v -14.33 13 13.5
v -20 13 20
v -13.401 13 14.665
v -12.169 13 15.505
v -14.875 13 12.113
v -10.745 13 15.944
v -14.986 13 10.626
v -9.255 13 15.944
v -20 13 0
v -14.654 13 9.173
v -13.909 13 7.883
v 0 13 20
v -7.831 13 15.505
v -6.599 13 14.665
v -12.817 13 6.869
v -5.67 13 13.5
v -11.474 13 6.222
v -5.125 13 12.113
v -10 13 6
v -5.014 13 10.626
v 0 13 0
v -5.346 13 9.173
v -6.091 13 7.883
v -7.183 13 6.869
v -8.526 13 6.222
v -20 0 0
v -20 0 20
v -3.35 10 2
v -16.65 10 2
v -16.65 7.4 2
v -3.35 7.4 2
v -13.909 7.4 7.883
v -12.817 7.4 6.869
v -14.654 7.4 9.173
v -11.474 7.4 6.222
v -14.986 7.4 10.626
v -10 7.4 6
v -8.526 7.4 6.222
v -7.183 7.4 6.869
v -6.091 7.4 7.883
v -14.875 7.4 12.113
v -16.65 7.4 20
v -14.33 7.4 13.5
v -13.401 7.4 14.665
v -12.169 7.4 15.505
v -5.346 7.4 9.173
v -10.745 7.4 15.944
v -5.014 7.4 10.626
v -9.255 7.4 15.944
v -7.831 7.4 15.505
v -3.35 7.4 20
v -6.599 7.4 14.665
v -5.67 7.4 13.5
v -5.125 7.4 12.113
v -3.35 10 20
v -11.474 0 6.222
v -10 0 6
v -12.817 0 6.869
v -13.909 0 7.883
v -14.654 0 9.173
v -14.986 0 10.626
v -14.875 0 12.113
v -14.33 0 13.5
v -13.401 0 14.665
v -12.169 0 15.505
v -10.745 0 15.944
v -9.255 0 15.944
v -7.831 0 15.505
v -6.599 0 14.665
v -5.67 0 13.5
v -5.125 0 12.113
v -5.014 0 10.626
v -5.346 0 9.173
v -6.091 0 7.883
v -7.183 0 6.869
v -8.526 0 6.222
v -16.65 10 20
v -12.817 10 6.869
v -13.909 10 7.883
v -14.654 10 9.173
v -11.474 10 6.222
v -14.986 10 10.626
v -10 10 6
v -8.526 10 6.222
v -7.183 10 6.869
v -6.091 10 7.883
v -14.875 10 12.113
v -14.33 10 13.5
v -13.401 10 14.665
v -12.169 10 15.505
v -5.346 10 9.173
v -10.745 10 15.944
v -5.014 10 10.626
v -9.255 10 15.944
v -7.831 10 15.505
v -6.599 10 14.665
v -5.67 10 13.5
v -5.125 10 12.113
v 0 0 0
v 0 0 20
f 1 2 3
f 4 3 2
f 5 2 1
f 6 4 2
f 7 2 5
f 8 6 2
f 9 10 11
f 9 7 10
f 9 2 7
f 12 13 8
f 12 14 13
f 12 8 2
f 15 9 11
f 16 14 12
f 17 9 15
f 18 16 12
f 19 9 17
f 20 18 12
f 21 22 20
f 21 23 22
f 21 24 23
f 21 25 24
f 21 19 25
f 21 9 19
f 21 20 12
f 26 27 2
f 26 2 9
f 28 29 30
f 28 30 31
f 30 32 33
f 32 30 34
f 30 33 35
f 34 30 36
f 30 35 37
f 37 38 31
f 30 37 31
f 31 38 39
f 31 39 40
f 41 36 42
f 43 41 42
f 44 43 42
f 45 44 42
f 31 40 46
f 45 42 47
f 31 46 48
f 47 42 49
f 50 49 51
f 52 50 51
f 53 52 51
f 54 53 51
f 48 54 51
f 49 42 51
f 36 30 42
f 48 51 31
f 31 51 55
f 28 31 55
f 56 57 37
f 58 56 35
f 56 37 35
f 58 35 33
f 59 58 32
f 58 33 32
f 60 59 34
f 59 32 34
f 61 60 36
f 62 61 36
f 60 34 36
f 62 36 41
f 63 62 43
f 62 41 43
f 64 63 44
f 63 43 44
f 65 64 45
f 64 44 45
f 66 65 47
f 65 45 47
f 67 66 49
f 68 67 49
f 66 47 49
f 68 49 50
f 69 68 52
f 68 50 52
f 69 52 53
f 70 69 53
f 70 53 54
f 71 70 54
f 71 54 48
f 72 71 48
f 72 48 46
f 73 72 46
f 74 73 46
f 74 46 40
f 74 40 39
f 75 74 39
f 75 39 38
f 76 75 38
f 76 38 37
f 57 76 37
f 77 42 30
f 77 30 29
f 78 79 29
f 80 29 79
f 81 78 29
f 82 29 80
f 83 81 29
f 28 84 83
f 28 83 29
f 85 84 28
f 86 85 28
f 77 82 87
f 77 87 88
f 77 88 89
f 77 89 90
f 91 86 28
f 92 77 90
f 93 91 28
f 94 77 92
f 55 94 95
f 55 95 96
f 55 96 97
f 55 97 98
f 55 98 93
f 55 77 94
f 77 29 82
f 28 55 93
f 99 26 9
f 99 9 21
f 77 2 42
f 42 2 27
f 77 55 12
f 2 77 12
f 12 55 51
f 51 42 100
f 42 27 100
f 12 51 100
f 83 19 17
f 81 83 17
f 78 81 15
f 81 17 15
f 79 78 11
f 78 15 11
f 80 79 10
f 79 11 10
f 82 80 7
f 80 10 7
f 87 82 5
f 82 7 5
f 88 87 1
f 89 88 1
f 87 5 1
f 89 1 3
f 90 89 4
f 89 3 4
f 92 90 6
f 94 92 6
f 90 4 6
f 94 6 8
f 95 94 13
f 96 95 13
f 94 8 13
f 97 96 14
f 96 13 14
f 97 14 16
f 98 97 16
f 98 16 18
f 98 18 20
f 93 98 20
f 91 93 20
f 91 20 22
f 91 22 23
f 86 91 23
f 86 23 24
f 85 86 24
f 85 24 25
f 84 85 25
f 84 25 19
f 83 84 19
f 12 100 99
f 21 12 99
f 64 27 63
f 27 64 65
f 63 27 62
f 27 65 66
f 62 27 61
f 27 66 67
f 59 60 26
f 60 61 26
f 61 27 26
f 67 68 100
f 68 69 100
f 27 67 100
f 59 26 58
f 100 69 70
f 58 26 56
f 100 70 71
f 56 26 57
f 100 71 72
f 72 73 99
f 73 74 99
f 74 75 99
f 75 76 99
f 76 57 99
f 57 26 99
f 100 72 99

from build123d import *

# Parameters (mm, degrees)
CROQUIS1_W              = 20
CROQUIS1_H              = 20
SALIENTE_EXTRUIR1_DEPTH = 13
CROQUIS3_W              = 13.3
CROQUIS3_H              = 2.6
CORTAR_EXTRUIR1_DEPTH   = 18
CORTAR_EXTRUIR2_REACH   = 33.129
CROQUIS4_R              = 5


with BuildPart() as part:
    # Croquis1 → Saliente-Extruir1 (new body)
    with BuildSketch(Plane(origin=(0, 0, 0), x_dir=(1, 0, 0), z_dir=(0, 1, 0))):
        with Locations((-10, -10)):
            Rectangle(CROQUIS1_W, CROQUIS1_H)
    extrude(amount=SALIENTE_EXTRUIR1_DEPTH)

    # Croquis3 → Cortar-Extruir1 (cut)
    with BuildSketch(Plane.XY.offset(20)):
        with Locations((-10, 8.7)):
            Rectangle(CROQUIS3_W, CROQUIS3_H)
    extrude(amount=-CORTAR_EXTRUIR1_DEPTH, mode=Mode.SUBTRACT)

    # Cortar-Extruir2: up to this face of the body (flat: up to its plane)
    cortar_extruir2_end = Plane(part.part.faces().sort_by_distance((-10, 0, 10))[0])
    # Croquis4 → Cortar-Extruir2 (cut, up to the picked face)
    with BuildSketch(Plane(origin=(0, 13, 0), x_dir=(1, 0, 0), z_dir=(0, 1, 0)), mode=Mode.PRIVATE) as cortar_extruir2_sk1:
        with Locations(Location((-10, -11, 0), (0, 0, 90))):
            Circle(CROQUIS4_R)
    cortar_extruir2_tool1 = split(extrude(cortar_extruir2_sk1.sketch, amount=-CORTAR_EXTRUIR2_REACH, mode=Mode.PRIVATE), bisect_by=cortar_extruir2_end, keep=Keep.BOTH, mode=Mode.PRIVATE)
    add(cortar_extruir2_tool1.solids().sort_by(Axis((-10, 13, 11), (0, -1, 0)))[0], mode=Mode.SUBTRACT)


solid = part.part
